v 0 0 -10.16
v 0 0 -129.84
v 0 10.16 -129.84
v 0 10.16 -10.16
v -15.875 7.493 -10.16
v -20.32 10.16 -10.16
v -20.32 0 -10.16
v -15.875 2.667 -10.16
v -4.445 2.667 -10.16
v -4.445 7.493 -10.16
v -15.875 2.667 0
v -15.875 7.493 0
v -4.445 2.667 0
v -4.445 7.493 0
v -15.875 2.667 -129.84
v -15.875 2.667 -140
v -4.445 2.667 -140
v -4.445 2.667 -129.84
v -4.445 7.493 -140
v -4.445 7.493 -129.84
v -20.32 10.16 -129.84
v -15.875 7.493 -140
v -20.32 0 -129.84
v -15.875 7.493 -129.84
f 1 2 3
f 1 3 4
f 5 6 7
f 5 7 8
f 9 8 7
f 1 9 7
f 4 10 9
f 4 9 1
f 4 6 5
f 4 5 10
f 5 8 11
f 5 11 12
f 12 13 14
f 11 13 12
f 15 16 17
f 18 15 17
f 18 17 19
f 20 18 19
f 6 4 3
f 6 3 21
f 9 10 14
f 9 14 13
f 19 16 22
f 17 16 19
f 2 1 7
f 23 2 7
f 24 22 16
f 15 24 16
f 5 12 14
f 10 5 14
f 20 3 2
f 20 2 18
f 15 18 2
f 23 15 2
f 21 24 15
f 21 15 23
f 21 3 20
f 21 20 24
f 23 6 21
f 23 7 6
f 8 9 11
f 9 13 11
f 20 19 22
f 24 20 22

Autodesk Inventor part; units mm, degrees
ref_plane "YZ Plane" through (0, 0, 0) normal (1, 0, 0) x (0, 1, 0)
ref_plane "XZ Plane" through (0, 0, 0) normal (0, 1, 0) x (-1, 0, 0)
ref_plane "XY Plane" through (0, 0, 0) normal (0, 0, 1) x (1, 0, 0)
sketch "Sketch1" plane through (0, 0, 0) normal (0, 1, 0) x (-1, 0, 0)
  line L0 (0, 0) -> (20.32, 0)
  line L1 (20.32, 0) -> (20.32, -140)
  line L2 (20.32, -140) -> (0, -140)
  line L3 (0, -140) -> (0, 0)
  dimension "d0" = 140
  dimension "d1" = 20.32
extrude "Extrusion1" add sketch "Sketch1" along normal blind 10.16
sketch "Sketch2" plane through (-20.32, 0, 0) normal (0, 0, 1) x (1, 0, 0)
  line L0 (4.445, 7.493) -> (15.875, 7.493)
  line L1 (15.875, 7.493) -> (15.875, 2.667)
  line L2 (15.875, 2.667) -> (4.445, 2.667)
  line L3 (4.445, 2.667) -> (4.445, 7.493)
  line L4 (0, 10.16) -> (20.32, 10.16) projected
  line L5 (0, 0) -> (20.32, 0) projected
  line L6 (0, 0) -> (0, 10.16) projected
  line L7 (20.32, 0) -> (20.32, 10.16) projected
  line L8 (0, 10.16) -> (20.32, 10.16)
  line L9 (20.32, 10.16) -> (20.32, 0)
  line L10 (20.32, 0) -> (0, 0)
  line L11 (0, 0) -> (0, 10.16)
  dimension "d4" = 4.826
  dimension "d5" = 11.43
  dimension "d6" = 2.667
  dimension "d7" = 2.667
  dimension "d8" = 4.445
  dimension "d9" = 4.445
extrude "Extrusion2" cut sketch "Sketch2" against normal blind 10.16
sketch "Sketch3" plane through (0, 0, -140) normal (0, 0, -1) x (-1, 0, 0)
  line L0 (4.445, 7.493) -> (15.875, 7.493) projected
  line L1 (15.875, 2.667) -> (4.445, 2.667) projected
  line L2 (4.445, 7.493) -> (15.875, 7.493)
  line L3 (15.875, 7.493) -> (15.875, 2.667)
  line L4 (15.875, 2.667) -> (4.445, 2.667)
  line L5 (4.445, 2.667) -> (4.445, 7.493)
  line L6 (20.32, 0) -> (20.32, 10.16) projected
  line L7 (0, 10.16) -> (0, 0) projected
  line L8 (20.32, 10.16) -> (0, 10.16)
  line L9 (0, 10.16) -> (0, 0)
  line L10 (0, 0) -> (20.32, 0)
  line L11 (20.32, 0) -> (20.32, 10.16)
extrude "Extrusion3" cut sketch "Sketch3" against normal blind 10.16
equation "\"d6\" = d7"
equation "\"d8\" = d9"
properties part number "spool holder span" material "PLA"
